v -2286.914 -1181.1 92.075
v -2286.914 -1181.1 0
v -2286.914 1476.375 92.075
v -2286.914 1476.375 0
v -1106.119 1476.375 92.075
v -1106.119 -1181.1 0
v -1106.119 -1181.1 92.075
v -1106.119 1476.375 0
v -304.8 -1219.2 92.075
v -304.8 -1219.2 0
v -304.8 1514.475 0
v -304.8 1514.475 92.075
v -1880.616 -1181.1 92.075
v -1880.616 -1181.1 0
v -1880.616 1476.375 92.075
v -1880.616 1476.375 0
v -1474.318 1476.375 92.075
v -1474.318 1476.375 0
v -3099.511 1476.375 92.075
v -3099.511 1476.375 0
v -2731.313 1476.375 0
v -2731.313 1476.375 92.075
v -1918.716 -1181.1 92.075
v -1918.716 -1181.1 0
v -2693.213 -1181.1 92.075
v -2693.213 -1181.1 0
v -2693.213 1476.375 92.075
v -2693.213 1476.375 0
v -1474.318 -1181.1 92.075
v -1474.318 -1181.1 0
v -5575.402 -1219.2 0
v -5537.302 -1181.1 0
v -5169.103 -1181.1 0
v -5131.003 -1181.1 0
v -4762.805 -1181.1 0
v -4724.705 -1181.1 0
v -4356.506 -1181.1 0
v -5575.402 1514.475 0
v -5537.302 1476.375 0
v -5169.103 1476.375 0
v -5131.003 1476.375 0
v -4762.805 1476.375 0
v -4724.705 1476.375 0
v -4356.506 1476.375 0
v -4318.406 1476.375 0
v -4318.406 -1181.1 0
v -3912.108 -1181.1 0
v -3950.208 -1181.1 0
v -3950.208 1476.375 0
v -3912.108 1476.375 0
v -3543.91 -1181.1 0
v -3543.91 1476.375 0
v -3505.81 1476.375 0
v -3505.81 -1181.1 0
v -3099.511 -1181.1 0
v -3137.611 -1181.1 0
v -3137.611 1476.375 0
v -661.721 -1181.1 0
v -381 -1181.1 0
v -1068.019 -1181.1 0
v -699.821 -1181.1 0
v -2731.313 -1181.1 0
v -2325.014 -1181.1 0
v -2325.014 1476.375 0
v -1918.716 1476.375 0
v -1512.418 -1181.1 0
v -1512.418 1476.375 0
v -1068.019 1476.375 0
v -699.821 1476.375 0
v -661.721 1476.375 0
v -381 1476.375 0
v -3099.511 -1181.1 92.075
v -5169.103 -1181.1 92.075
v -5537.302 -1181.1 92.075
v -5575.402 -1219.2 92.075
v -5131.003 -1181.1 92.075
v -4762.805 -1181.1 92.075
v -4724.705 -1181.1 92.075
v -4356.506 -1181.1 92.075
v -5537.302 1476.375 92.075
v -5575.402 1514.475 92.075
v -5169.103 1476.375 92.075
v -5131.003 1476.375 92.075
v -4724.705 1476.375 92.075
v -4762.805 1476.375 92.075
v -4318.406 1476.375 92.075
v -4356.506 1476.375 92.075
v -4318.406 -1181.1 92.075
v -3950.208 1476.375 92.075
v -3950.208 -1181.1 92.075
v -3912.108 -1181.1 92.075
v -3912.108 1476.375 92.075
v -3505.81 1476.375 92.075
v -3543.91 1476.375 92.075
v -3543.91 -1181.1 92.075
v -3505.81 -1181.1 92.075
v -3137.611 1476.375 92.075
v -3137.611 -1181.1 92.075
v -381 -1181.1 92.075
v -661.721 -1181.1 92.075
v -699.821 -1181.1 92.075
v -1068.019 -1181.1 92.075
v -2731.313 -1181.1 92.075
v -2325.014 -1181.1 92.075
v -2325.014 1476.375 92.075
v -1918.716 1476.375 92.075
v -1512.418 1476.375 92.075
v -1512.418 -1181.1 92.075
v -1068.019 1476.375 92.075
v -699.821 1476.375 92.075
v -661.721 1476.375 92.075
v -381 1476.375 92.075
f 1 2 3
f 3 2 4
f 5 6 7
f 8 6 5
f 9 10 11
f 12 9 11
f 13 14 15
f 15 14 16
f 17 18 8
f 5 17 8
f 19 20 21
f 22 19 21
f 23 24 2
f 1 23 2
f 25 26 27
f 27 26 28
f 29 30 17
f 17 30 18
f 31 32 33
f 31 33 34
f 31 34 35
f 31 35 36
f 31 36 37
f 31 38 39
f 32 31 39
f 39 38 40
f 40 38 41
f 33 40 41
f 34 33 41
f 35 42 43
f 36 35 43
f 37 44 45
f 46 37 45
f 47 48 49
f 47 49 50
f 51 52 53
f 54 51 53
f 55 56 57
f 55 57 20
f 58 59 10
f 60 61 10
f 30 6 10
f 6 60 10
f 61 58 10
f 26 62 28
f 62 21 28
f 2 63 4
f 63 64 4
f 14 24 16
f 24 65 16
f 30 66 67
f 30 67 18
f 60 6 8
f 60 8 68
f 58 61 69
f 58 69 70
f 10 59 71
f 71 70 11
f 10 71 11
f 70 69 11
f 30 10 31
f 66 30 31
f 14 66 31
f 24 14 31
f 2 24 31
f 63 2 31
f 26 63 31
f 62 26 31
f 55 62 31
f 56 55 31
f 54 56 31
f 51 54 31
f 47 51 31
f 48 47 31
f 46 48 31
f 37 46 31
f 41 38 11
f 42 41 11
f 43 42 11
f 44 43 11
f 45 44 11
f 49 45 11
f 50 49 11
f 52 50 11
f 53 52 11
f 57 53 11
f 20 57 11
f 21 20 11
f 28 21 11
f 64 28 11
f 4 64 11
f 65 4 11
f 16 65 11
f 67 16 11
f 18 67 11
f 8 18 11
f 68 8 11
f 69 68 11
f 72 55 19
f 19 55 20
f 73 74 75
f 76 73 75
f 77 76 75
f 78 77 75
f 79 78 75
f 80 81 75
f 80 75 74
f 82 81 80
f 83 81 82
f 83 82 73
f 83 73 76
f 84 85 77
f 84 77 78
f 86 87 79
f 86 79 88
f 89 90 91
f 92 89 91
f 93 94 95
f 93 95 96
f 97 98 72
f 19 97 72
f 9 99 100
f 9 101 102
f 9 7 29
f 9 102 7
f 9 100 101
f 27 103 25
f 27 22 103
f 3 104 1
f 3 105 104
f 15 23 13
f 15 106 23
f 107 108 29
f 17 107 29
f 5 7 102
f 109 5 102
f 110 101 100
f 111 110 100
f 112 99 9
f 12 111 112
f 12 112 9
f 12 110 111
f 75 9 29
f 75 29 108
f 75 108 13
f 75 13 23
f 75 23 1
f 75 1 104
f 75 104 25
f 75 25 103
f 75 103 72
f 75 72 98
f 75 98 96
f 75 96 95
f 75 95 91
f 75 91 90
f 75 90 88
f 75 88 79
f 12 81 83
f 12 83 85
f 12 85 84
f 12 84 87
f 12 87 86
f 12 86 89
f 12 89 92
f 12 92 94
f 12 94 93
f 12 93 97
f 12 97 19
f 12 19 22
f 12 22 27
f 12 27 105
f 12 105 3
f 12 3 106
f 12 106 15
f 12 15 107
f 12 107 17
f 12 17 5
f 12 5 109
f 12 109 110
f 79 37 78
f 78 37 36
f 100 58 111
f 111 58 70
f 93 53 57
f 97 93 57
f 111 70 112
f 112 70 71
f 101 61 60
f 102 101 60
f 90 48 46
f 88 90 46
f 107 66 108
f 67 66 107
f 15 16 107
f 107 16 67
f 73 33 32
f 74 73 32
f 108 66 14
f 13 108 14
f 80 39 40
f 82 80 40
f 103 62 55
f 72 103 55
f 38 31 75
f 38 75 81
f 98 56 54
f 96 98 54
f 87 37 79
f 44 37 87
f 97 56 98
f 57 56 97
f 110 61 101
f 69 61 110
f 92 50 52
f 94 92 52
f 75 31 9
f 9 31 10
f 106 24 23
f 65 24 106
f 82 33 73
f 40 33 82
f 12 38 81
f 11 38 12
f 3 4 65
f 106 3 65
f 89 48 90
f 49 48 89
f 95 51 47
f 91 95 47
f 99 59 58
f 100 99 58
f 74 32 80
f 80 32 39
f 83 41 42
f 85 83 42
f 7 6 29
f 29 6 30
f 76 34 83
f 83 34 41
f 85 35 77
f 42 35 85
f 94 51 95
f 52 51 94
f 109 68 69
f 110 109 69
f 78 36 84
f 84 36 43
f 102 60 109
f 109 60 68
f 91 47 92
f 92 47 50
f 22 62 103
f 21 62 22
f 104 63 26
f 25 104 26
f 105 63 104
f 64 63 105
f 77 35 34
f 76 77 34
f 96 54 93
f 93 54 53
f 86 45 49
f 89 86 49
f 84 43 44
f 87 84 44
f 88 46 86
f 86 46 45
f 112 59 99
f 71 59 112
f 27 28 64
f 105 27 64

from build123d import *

# Parameters (mm, degrees)
F0_W     = 5270.6016
F0_H     = 2733.675
F0_W_2   = 38.1
F0_H_2   = 2657.475
F1_DEPTH = 92.075


# Not quite as in the source:
# - a feature names something its author has since deleted; it is built from what else it names


with BuildPart() as f1:
    # F0 (on Top) → F1 (new body)
    with BuildSketch(Plane.XY):
        with Locations((-2940.1008, 147.6375)):
            Rectangle(F0_W, F0_H)
        Polygon((-5537.3016, -1181.1), (-5537.3016, 1476.375), (-5169.1032, 1476.375), (-5131.0032, 1476.375), (-4762.8048, 1476.375), (-4724.7048, 1476.375), (-4356.5064, 1476.375), (-4318.4064, 1476.375), (-3950.208, 1476.375), (-3912.108, 1476.375), (-3543.9096, 1476.375), (-3505.8096, 1476.375), (-3137.6112, 1476.375), (-3099.5112, 1476.375), (-2731.3128, 1476.375), (-2693.2128, 1476.375), (-2325.0144, 1476.375), (-2286.9144, 1476.375), (-1918.716, 1476.375), (-1880.616, 1476.375), (-1512.4176, 1476.375), (-1474.3176, 1476.375), (-1106.1192, 1476.375), (-1068.0192, 1476.375), (-699.8208, 1476.375), (-661.7208, 1476.375), (-381, 1476.375), (-342.9, 1476.375), (-342.9, -1181.1), (-381, -1181.1), (-661.7208, -1181.1), (-699.8208, -1181.1), (-1068.0192, -1181.1), (-1106.1192, -1181.1), (-1474.3176, -1181.1), (-1512.4176, -1181.1), (-1880.616, -1181.1), (-1918.716, -1181.1), (-2286.9144, -1181.1), (-2325.0144, -1181.1), (-2693.2128, -1181.1), (-2731.3128, -1181.1), (-3099.5112, -1181.1), (-3137.6112, -1181.1), (-3505.8096, -1181.1), (-3543.9096, -1181.1), (-3912.108, -1181.1), (-3950.208, -1181.1), (-4318.4064, -1181.1), (-4356.5064, -1181.1), (-4724.7048, -1181.1), (-4762.8048, -1181.1), (-5131.0032, -1181.1), (-5169.1032, -1181.1), align=None, mode=Mode.SUBTRACT)
        with Locations((-5150.0532, 147.6375)):
            Rectangle(F0_W_2, F0_H_2)
        with Locations((-4743.7548, 147.6375)):
            Rectangle(F0_W_2, F0_H_2)
        with Locations((-4337.4564, 147.6375)):
            Rectangle(F0_W_2, F0_H_2)
        with Locations((-3931.158, 147.6375)):
            Rectangle(F0_W_2, F0_H_2)
        with Locations((-3524.8596, 147.6375)):
            Rectangle(F0_W_2, F0_H_2)
        with Locations((-3118.5612, 147.6375)):
            Rectangle(F0_W_2, F0_H_2)
        with Locations((-2712.2628, 147.6375)):
            Rectangle(F0_W_2, F0_H_2)
        with Locations((-2305.9644, 147.6375)):
            Rectangle(F0_W_2, F0_H_2)
        with Locations((-1899.666, 147.6375)):
            Rectangle(F0_W_2, F0_H_2)
        with Locations((-1493.3676, 147.6375)):
            Rectangle(F0_W_2, F0_H_2)
        with Locations((-1087.0692, 147.6375)):
            Rectangle(F0_W_2, F0_H_2)
        with Locations((-361.95, 147.6375)):
            Rectangle(F0_W_2, F0_H_2)
        with Locations((-680.7708, 147.6375)):
            Rectangle(F0_W_2, F0_H_2)
    extrude(amount=F1_DEPTH)


solid = f1.part
